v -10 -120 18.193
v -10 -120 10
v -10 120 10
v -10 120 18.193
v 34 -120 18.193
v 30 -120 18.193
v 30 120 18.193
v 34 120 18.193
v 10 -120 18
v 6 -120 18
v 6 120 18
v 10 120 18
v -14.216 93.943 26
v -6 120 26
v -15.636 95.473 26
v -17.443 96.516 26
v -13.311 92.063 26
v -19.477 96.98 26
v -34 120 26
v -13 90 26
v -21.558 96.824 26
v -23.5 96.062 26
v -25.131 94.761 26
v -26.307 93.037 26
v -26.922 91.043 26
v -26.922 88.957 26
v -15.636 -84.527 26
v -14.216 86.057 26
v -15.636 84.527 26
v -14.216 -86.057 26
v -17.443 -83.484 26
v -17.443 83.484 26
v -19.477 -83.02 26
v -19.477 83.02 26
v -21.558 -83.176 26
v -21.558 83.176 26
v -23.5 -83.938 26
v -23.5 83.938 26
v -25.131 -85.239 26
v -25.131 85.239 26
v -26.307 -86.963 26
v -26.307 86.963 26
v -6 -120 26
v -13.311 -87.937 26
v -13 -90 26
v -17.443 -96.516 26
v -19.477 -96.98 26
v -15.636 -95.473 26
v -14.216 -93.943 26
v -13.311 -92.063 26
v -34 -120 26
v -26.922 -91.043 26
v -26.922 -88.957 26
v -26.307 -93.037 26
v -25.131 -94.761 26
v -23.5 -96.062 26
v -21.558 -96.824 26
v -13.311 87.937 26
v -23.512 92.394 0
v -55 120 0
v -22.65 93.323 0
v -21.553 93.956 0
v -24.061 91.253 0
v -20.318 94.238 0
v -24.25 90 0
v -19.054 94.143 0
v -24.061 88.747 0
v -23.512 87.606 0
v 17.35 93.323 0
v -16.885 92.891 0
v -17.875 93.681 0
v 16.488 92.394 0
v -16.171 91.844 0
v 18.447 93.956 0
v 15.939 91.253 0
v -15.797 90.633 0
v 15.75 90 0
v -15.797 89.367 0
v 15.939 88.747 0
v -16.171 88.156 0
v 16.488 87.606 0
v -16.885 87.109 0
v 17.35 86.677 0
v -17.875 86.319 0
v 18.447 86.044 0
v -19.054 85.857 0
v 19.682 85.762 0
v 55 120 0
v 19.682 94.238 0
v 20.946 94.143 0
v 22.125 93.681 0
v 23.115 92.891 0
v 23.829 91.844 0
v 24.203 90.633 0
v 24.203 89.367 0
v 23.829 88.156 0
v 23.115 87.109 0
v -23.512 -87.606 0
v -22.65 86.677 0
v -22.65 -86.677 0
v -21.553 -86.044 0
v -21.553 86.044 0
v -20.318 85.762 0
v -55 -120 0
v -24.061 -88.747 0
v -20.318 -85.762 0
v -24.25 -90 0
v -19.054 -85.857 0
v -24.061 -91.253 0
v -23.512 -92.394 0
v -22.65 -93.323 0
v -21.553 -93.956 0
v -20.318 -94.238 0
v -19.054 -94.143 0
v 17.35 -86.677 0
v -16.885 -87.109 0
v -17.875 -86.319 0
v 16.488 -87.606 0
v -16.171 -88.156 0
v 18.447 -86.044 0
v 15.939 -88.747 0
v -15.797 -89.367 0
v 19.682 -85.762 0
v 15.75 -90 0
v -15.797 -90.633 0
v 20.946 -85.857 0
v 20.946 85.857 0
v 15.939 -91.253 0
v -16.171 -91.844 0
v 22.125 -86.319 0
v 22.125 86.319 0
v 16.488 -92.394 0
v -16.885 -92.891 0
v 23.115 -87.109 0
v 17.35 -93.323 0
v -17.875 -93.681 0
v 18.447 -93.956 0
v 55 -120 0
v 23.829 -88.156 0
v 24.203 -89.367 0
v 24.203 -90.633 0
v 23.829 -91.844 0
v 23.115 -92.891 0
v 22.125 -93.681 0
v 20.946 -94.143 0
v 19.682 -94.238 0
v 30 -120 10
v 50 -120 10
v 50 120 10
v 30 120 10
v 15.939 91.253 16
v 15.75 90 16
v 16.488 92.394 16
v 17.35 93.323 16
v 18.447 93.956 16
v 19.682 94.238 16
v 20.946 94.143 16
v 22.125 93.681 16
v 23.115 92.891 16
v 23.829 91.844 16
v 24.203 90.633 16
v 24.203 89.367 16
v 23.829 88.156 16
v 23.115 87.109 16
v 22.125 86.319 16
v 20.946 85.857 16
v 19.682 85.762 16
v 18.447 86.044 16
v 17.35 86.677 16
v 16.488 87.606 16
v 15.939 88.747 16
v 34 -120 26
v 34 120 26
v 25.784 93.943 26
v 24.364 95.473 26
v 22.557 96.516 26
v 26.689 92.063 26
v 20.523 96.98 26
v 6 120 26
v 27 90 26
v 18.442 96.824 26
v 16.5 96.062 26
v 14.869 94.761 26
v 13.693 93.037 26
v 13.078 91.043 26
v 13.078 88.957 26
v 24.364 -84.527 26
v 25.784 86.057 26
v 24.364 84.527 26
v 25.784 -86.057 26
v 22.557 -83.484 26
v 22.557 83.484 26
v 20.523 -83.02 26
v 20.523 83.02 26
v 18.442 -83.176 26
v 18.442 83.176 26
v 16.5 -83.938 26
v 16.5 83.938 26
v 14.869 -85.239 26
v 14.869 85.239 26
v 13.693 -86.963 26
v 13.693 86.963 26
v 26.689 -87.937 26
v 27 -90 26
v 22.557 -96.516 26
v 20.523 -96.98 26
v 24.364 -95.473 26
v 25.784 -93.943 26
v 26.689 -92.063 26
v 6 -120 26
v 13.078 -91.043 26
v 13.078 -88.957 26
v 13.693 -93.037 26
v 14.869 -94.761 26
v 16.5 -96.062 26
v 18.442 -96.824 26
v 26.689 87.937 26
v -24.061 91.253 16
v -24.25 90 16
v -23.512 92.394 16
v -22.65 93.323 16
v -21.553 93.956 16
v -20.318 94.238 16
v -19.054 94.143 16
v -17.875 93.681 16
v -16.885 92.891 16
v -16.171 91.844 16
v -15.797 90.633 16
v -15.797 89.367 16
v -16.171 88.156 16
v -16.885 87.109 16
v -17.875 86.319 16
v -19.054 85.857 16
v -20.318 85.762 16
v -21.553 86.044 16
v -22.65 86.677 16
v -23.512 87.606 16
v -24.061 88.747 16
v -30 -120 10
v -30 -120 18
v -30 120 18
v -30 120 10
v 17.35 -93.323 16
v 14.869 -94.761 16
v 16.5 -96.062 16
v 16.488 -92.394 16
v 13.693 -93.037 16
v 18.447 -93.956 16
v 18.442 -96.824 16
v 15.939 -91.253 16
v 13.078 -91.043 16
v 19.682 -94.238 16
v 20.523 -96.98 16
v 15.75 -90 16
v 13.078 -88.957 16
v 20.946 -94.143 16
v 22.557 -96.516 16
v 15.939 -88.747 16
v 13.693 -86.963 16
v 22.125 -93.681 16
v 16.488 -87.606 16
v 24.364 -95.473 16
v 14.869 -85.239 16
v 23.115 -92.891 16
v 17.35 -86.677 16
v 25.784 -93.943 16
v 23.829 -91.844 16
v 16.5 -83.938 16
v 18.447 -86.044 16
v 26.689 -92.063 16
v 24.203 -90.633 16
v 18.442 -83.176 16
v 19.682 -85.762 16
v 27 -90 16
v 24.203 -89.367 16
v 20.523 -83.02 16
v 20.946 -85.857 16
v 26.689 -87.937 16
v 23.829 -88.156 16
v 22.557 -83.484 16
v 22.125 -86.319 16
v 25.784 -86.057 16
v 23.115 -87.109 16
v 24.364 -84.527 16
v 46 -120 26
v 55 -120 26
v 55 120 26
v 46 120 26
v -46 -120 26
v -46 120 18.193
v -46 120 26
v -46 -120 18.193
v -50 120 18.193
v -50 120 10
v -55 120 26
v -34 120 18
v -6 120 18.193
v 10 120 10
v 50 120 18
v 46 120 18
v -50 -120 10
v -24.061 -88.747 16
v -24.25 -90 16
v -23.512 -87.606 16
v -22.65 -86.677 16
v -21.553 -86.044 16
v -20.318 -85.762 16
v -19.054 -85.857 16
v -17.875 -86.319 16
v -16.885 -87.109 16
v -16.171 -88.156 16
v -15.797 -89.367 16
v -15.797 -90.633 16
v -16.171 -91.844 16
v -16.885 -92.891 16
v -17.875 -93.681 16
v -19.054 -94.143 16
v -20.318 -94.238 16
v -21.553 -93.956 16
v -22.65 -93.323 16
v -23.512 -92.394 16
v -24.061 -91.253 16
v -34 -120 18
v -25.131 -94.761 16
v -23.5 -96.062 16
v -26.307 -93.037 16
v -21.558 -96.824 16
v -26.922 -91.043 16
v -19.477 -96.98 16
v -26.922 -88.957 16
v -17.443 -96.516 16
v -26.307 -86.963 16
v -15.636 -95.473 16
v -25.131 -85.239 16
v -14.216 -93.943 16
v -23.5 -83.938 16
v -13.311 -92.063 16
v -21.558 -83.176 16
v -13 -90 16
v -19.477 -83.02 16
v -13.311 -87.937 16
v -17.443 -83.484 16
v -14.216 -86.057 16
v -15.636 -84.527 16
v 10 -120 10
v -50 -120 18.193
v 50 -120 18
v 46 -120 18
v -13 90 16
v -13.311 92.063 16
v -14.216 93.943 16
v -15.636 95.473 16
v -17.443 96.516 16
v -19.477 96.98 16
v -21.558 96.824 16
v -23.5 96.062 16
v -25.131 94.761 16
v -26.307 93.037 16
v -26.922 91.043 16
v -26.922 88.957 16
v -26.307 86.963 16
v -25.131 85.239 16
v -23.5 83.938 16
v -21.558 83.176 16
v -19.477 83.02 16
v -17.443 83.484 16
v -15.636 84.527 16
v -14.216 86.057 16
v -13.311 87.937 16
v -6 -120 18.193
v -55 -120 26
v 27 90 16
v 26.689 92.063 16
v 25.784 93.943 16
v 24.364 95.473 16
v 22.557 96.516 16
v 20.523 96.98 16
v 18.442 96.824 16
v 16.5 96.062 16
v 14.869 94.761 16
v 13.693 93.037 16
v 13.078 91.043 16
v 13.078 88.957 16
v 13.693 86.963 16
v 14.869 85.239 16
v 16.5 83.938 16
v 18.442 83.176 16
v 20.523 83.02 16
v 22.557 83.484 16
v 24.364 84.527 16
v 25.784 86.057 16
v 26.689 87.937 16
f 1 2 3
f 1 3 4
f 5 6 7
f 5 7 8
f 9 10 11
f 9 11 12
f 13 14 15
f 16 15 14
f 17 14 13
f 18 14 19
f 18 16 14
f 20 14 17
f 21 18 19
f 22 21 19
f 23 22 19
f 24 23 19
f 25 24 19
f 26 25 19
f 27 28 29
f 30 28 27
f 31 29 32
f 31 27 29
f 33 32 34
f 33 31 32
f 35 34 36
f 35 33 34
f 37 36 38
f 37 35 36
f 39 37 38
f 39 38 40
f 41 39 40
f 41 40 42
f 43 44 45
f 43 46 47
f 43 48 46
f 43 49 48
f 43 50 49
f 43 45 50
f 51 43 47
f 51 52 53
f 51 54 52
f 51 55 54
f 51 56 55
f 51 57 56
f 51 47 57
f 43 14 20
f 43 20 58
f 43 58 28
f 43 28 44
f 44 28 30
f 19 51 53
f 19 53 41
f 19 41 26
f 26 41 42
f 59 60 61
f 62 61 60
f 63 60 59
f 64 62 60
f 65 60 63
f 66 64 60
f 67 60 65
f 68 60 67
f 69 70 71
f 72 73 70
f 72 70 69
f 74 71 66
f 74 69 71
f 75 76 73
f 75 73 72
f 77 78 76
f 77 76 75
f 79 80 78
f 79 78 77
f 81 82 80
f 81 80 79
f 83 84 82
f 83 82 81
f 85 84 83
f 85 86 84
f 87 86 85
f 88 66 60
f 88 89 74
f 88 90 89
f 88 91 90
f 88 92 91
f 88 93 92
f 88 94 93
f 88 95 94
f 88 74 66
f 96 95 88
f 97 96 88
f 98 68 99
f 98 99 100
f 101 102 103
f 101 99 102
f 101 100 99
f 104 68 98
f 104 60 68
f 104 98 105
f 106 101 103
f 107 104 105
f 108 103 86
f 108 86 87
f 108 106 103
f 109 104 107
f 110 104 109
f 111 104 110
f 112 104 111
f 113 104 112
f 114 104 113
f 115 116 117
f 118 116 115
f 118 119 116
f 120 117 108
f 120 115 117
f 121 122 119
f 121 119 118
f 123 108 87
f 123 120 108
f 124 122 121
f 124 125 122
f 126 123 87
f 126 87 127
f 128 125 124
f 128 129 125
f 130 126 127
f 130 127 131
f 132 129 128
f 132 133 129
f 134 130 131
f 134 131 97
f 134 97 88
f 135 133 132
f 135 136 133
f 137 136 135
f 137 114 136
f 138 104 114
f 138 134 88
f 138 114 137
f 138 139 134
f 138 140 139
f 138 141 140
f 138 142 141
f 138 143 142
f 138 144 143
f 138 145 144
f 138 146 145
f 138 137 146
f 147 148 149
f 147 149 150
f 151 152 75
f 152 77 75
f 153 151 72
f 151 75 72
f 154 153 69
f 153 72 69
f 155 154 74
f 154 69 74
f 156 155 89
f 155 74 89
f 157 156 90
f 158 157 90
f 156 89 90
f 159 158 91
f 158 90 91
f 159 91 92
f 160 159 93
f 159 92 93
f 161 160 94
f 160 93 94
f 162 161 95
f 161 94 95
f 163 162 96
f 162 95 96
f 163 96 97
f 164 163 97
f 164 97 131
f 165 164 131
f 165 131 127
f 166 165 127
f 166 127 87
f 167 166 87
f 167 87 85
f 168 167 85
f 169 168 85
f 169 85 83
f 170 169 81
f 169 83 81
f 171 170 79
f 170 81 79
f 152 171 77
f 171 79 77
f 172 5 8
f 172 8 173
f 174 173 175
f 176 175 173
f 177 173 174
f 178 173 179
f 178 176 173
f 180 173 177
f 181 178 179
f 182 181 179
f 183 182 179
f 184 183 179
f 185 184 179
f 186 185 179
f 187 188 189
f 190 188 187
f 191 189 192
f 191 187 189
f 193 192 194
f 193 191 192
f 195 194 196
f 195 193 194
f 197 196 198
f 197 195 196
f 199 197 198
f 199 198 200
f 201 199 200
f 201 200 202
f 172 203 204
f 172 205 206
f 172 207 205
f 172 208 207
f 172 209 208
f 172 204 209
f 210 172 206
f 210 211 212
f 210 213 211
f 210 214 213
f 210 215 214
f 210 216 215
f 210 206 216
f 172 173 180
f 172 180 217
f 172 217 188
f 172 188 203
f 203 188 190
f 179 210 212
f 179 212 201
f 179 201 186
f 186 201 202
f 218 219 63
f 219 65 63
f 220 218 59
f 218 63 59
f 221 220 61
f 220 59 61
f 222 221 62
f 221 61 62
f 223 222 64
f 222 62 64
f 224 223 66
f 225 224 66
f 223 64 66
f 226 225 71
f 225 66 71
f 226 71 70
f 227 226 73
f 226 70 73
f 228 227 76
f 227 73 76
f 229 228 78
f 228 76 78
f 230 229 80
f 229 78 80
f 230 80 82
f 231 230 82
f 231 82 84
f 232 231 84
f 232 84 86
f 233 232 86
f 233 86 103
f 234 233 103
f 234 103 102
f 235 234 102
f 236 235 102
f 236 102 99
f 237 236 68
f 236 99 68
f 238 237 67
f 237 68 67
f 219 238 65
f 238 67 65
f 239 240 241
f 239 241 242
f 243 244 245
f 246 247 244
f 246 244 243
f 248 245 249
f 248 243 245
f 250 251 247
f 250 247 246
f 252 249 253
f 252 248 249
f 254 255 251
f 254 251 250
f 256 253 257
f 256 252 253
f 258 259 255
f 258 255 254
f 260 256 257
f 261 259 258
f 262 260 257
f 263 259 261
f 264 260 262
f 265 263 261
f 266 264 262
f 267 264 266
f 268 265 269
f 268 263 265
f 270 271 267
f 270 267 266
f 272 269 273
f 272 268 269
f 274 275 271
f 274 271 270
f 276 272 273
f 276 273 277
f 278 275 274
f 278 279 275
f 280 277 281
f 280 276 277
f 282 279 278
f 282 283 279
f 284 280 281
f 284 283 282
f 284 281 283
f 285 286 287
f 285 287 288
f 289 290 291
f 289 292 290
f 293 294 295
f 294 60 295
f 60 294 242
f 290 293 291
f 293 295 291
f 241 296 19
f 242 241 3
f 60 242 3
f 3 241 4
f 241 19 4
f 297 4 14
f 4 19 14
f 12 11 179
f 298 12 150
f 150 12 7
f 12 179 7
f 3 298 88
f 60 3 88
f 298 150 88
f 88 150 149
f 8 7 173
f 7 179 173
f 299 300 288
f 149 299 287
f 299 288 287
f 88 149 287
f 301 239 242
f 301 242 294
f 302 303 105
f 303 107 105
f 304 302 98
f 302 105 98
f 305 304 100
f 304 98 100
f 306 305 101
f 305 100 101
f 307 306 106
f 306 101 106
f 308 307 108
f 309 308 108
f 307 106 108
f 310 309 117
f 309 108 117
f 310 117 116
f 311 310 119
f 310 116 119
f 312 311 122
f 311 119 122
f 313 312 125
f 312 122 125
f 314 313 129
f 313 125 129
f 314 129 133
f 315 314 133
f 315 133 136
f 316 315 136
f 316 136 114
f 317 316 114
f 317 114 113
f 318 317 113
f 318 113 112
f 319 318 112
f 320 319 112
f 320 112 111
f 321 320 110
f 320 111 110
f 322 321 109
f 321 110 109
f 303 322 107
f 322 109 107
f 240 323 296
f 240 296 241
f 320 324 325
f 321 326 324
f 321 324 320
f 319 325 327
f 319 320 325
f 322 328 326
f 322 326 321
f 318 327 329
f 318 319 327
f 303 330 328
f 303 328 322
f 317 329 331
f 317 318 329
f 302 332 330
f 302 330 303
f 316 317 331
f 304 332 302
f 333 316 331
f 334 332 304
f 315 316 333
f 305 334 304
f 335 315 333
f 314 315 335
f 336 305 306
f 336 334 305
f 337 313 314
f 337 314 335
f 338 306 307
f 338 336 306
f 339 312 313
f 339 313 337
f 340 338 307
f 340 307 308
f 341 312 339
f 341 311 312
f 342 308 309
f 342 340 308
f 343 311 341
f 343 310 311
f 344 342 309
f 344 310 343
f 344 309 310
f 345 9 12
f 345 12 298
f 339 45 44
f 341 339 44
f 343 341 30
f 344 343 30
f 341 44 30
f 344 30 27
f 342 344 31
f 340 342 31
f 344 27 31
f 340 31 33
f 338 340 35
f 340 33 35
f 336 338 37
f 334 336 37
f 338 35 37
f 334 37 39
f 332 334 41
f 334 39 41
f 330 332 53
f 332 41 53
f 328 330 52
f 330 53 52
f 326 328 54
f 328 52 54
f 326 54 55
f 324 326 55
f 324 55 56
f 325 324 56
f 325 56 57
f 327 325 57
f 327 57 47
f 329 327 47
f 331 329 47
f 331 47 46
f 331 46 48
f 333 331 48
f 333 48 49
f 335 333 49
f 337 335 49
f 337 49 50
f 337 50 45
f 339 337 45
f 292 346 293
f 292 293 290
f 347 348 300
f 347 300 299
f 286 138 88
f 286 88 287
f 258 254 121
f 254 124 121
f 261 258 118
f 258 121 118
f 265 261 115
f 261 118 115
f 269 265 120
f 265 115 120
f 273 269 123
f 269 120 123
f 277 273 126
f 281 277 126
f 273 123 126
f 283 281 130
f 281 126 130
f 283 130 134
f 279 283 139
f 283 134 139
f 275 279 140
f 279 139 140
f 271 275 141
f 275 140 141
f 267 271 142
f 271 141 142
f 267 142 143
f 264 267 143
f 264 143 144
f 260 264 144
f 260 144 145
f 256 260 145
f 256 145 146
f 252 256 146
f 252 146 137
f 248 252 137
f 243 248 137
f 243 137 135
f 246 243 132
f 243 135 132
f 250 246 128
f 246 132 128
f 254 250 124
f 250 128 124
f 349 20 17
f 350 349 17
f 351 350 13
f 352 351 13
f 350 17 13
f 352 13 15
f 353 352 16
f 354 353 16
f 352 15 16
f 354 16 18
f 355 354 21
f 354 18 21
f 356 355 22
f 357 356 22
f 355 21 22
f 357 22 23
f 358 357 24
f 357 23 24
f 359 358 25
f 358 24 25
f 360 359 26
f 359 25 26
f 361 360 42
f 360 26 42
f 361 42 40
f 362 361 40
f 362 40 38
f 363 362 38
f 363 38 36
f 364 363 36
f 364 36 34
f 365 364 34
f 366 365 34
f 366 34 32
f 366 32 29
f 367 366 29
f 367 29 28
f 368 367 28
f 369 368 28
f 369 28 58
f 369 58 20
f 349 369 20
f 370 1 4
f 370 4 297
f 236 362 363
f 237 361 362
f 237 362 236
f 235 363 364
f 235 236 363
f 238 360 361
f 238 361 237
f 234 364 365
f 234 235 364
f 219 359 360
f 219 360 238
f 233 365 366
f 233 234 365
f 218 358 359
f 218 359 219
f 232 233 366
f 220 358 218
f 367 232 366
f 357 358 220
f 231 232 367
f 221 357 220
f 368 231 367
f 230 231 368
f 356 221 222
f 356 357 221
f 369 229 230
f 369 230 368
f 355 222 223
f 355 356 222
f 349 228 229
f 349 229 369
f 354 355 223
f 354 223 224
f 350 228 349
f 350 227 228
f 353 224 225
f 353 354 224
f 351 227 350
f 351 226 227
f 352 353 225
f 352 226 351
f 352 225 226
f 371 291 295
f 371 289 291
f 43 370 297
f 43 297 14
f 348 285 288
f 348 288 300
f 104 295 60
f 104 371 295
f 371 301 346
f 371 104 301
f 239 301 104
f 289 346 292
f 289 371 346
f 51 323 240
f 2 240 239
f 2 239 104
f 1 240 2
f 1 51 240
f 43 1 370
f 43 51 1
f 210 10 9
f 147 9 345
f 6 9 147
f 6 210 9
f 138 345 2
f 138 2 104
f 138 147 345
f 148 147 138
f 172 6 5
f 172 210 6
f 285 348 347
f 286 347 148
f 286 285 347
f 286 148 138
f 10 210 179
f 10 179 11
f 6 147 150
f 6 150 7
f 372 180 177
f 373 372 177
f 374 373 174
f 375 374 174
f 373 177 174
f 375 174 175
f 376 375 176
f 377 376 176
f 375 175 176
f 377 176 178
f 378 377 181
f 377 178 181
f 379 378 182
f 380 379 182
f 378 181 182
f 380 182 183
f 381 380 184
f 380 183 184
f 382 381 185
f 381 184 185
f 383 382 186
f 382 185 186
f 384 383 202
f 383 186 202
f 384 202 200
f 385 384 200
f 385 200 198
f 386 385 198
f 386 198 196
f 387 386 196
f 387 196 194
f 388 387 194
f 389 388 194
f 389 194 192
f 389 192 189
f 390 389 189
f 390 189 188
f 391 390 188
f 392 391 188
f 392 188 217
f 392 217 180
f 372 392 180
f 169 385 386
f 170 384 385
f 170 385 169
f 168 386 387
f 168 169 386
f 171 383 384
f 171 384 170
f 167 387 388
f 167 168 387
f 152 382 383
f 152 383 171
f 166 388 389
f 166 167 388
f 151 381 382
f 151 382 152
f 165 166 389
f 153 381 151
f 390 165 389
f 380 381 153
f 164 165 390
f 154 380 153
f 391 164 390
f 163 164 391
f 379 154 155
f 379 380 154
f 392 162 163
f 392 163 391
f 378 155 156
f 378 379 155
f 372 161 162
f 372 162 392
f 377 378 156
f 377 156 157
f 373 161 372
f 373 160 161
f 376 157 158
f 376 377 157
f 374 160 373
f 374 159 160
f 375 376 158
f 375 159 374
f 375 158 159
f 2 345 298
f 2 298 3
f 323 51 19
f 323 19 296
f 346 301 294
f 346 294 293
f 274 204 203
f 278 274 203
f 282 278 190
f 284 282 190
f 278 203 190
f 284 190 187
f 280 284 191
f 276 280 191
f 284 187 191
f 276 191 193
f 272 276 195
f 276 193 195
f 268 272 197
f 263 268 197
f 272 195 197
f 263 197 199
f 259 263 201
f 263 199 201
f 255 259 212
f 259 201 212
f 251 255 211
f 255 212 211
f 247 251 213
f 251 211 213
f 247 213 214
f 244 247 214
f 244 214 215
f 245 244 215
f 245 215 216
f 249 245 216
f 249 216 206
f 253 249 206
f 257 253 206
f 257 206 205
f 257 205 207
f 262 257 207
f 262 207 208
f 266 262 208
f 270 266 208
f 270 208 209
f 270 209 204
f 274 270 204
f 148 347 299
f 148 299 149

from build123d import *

# Parameters (mm, degrees)
F1_DEPTH       = 120
F3_D           = 8.5
F3_CBORE_D     = 14
F3_CBORE_DEPTH = 10


with BuildPart() as f1:
    # F0 (on Front) → F1 (new body, symmetric)
    with BuildSketch(Plane.XZ):
        Polygon((-55, 26), (-55, 0), (55, 0), (55, 26), (46, 26), (46, 18), (50, 18), (50, 10), (30, 10), (30, 18.192771), (34, 18.192771), (34, 26), (6, 26), (6, 18), (10, 18), (10, 10), (-10, 10), (-10, 18.192771), (-6, 18.192771), (-6, 26), (-34, 26), (-34, 18), (-30, 18), (-30, 10), (-50, 10), (-50, 18.192771), (-46, 18.192771), (-46, 26), align=None)
    extrude(amount=F1_DEPTH, both=True)

    # F3 (through all)
    with Locations(Plane.XY.offset(26)):
        with Locations((-20, -90), (20, -90), (-20, 90), (20, 90)):
            CounterBoreHole(F3_D / 2, F3_CBORE_D / 2, F3_CBORE_DEPTH)


with BuildPart() as f4_1:
    # F4: copy of F1
    add(f1.part)


solid = f1.part
